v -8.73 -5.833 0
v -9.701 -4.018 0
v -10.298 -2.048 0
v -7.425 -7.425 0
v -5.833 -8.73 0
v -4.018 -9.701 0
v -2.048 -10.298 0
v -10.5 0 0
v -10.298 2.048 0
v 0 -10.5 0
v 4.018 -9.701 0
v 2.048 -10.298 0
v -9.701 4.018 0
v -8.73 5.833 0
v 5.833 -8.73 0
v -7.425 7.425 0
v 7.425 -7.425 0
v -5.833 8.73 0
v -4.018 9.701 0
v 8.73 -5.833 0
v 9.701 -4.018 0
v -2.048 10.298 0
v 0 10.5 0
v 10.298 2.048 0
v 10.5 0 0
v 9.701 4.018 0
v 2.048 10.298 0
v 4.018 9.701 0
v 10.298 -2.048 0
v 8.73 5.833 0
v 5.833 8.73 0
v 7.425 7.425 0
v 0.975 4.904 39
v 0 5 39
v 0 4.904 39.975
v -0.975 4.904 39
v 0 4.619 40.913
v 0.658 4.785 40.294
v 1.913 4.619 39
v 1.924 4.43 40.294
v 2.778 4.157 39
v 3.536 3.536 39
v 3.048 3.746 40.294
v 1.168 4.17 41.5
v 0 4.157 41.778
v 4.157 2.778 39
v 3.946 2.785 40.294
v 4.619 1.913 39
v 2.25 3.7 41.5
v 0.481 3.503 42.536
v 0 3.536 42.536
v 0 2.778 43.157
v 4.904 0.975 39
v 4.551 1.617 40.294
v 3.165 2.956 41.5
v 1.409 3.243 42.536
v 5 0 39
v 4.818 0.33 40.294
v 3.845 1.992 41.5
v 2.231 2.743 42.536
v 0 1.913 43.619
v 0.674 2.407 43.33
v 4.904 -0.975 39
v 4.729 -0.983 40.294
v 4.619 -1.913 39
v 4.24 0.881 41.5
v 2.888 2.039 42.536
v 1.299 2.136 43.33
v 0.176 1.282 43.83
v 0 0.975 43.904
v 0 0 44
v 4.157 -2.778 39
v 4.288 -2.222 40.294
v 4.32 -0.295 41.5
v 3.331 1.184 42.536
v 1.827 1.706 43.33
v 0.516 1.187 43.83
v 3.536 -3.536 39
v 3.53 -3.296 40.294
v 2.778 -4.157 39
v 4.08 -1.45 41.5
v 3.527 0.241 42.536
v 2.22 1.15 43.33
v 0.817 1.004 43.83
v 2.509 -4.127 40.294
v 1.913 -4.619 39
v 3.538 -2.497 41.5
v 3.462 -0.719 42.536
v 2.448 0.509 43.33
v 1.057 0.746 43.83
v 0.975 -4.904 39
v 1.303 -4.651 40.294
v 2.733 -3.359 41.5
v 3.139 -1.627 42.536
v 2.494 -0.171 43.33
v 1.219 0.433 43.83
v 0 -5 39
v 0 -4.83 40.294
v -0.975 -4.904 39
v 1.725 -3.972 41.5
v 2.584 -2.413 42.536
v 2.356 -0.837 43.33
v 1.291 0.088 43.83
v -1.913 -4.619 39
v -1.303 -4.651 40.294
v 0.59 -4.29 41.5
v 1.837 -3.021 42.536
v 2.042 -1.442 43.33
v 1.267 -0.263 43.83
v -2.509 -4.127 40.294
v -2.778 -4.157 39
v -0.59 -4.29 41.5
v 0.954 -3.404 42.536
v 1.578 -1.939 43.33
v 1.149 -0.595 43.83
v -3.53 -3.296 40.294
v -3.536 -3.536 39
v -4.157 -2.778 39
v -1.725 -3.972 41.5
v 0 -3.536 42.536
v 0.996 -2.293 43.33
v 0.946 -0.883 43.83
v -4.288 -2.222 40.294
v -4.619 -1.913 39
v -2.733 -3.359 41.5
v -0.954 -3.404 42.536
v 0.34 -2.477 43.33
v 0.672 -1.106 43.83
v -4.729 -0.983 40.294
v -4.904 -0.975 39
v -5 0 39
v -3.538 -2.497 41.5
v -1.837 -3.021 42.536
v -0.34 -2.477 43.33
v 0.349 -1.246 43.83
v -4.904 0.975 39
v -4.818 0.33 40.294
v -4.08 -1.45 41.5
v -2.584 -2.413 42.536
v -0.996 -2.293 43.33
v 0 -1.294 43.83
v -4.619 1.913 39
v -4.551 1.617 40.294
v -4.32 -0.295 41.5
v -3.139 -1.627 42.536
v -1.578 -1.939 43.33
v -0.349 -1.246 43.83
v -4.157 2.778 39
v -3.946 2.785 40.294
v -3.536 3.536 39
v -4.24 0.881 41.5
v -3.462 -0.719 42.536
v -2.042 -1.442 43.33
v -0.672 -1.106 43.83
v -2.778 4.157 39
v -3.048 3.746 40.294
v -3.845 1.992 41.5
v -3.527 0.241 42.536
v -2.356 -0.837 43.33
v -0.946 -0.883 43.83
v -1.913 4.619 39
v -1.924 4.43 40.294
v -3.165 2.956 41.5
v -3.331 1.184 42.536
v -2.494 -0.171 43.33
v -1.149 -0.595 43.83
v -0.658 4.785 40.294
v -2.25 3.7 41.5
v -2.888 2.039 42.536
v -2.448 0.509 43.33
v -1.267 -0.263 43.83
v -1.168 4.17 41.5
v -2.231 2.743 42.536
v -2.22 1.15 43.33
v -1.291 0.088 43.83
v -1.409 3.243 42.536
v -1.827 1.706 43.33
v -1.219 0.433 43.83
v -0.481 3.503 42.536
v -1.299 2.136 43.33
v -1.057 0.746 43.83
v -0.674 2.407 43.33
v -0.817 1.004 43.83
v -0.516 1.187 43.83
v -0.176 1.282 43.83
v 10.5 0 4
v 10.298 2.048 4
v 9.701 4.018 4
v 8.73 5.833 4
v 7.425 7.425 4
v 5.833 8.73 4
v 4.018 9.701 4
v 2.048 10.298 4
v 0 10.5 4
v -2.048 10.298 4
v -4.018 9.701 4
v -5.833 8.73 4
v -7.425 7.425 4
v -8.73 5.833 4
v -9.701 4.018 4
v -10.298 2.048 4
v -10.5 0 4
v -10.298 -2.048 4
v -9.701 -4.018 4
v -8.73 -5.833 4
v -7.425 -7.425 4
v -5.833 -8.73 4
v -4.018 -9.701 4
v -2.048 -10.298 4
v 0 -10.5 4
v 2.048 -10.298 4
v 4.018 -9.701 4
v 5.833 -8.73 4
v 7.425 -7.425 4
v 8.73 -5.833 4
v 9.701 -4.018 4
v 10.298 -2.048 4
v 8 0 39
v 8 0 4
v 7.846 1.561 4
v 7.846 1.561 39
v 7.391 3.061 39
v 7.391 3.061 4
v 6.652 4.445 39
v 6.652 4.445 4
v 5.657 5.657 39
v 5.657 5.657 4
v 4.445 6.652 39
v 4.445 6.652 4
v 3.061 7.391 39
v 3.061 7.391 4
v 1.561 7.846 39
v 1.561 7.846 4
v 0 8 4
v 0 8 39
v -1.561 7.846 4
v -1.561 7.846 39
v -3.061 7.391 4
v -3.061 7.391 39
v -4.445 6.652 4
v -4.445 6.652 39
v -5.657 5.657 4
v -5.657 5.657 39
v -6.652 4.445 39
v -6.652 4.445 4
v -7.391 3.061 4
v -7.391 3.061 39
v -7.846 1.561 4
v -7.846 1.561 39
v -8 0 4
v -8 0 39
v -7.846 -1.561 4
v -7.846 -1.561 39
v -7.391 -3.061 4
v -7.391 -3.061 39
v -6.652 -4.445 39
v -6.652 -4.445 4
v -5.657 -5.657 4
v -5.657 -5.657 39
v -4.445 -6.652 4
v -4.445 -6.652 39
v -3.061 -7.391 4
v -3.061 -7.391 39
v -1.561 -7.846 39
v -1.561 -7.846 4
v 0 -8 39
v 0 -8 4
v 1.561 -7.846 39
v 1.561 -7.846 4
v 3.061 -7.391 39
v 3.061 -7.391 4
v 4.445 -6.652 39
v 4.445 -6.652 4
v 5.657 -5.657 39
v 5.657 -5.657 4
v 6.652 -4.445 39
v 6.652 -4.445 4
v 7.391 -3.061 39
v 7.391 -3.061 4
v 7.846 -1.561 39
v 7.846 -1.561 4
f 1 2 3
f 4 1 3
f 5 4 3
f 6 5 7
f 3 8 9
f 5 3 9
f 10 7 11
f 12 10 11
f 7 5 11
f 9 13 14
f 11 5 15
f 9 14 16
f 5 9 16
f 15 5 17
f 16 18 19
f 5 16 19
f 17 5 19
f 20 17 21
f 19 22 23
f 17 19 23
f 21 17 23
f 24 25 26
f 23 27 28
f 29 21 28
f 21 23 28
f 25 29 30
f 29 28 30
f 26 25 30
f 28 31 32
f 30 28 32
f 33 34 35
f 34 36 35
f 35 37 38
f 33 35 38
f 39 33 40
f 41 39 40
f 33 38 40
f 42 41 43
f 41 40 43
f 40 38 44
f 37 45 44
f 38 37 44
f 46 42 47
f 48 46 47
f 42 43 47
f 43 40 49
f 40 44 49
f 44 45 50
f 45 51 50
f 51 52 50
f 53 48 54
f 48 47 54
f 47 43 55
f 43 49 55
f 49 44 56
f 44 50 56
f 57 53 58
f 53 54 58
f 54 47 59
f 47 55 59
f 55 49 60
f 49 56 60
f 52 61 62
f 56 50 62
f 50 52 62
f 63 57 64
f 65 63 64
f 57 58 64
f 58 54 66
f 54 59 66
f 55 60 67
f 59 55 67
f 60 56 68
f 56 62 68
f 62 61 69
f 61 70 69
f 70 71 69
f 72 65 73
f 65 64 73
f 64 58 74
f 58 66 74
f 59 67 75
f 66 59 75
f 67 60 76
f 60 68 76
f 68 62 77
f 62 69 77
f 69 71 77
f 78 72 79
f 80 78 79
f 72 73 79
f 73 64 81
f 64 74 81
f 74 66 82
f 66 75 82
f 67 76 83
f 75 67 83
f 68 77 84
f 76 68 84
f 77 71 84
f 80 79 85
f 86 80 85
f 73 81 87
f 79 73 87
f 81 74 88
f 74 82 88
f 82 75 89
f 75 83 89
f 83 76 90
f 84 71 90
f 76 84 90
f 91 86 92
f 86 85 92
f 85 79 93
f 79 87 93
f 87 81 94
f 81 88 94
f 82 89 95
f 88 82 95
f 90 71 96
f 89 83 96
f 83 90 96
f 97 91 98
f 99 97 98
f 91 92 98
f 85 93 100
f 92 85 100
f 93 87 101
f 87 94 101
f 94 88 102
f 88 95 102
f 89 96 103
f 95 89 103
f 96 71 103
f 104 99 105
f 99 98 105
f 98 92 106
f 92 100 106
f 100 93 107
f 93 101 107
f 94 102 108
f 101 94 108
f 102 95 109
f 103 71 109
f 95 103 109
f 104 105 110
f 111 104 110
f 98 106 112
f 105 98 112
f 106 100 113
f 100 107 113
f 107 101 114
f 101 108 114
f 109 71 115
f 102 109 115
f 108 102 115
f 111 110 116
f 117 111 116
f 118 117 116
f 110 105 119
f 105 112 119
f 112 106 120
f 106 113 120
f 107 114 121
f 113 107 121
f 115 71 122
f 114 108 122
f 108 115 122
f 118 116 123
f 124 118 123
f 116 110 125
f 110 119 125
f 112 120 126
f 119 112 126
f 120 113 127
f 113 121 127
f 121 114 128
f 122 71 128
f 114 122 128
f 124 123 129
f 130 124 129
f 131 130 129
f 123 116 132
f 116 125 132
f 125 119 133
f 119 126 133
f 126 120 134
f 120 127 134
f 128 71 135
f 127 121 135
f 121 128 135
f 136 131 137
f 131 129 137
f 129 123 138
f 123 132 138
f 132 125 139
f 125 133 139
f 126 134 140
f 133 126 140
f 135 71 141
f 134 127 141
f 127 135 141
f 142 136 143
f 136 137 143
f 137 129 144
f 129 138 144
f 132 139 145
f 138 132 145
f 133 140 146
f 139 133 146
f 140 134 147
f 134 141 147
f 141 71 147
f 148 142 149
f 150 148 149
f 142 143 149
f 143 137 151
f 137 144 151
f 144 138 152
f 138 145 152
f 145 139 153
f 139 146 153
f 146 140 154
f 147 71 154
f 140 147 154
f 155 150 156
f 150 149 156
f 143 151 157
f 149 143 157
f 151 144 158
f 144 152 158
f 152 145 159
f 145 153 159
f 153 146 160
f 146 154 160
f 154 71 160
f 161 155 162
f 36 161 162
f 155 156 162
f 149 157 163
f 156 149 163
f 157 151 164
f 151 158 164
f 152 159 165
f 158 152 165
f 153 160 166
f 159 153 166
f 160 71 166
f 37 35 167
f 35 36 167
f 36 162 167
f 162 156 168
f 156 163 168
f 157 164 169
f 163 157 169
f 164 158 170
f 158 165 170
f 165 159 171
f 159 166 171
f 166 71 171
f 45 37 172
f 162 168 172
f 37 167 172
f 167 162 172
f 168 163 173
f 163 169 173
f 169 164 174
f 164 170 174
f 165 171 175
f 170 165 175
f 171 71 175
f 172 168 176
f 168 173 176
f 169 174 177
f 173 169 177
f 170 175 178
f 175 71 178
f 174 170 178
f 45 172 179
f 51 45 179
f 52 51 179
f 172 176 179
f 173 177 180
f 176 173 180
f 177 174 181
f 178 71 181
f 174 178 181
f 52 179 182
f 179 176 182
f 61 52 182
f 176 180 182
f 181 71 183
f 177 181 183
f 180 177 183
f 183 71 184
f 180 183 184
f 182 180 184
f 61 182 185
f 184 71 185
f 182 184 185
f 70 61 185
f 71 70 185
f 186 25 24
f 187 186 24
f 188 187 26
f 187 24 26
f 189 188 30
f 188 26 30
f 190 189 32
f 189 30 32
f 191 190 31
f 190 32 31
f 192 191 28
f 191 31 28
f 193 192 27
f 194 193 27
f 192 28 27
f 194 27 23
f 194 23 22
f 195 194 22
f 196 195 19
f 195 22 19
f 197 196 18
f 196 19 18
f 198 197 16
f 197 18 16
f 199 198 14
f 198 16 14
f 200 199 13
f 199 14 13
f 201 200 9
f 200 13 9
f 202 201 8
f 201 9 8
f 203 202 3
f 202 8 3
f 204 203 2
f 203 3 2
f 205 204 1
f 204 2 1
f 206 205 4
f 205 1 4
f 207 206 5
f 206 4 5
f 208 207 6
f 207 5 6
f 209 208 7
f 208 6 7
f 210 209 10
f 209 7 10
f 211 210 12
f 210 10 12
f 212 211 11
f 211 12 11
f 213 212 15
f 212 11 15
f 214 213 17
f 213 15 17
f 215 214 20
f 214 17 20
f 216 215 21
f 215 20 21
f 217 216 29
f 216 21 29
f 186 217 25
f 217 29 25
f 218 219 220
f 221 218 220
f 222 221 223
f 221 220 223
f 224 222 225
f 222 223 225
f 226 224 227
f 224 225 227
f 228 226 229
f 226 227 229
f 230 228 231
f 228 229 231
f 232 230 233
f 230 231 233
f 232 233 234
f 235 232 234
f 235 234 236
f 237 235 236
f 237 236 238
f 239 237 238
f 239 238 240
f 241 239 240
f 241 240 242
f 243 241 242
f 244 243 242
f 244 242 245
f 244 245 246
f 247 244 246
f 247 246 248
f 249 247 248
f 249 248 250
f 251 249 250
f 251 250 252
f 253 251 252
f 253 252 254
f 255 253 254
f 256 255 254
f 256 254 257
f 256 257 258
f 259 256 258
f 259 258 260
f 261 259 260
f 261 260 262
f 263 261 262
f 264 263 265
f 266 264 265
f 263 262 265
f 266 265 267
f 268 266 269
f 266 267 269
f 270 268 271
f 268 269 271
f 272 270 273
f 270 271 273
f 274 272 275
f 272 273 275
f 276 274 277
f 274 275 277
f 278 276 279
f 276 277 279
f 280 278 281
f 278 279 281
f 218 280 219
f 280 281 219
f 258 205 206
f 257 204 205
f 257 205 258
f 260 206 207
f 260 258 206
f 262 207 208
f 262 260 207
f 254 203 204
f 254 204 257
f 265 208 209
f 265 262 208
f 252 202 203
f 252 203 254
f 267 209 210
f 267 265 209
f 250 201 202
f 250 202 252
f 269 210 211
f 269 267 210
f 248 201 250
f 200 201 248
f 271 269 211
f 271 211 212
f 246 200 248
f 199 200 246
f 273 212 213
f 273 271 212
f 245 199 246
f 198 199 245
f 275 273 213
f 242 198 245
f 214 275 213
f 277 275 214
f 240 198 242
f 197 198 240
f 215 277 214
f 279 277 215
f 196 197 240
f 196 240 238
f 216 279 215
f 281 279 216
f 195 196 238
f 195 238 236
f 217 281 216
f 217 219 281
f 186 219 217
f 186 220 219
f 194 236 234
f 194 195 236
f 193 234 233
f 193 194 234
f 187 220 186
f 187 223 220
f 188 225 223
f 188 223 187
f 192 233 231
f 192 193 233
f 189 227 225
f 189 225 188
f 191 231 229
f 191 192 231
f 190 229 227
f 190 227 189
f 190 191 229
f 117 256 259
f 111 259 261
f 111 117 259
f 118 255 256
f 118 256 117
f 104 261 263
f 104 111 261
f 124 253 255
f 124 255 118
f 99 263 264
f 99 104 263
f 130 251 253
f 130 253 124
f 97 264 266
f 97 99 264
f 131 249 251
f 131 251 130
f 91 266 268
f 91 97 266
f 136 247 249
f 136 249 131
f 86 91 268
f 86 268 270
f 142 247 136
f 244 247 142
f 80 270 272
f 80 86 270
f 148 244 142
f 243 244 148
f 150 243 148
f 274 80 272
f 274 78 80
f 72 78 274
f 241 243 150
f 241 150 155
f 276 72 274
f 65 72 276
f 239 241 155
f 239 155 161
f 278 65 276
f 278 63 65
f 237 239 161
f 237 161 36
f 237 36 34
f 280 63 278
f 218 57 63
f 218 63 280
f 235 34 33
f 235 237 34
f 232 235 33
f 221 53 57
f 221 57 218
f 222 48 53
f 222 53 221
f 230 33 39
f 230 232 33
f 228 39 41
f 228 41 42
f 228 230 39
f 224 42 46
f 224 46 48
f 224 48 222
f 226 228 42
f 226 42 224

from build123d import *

# Parameters (mm, degrees)
F0_R     = 10.5
F1_DEPTH = 4
F2_R     = 8
F3_DEPTH = 39


# Not quite as in the source:
# - a feature names something its author has since deleted; it is built from what else it names


with BuildPart() as f1:
    # F0 (on Top) → F1 (new body)
    with BuildSketch(Plane.XY):
        Circle(F0_R)
    extrude(amount=F1_DEPTH)

    # F2 (on Top) → F3 (join)
    with BuildSketch(Plane.XY):
        Circle(F2_R)
    extrude(amount=F3_DEPTH)

    # F4 (on Right) → F5 (revolve)
    with BuildSketch(Plane.YZ):
        with BuildLine():
            ThreePointArc((5, 39), (3.5355339059, 42.5355339059), (0, 44))
            Line((0, 44), (0, 39))
            Line((0, 39), (5, 39))
        make_face()
    revolve(axis=Axis((0, 0, 41.5), (0, 0, -1)))


solid = f1.part
